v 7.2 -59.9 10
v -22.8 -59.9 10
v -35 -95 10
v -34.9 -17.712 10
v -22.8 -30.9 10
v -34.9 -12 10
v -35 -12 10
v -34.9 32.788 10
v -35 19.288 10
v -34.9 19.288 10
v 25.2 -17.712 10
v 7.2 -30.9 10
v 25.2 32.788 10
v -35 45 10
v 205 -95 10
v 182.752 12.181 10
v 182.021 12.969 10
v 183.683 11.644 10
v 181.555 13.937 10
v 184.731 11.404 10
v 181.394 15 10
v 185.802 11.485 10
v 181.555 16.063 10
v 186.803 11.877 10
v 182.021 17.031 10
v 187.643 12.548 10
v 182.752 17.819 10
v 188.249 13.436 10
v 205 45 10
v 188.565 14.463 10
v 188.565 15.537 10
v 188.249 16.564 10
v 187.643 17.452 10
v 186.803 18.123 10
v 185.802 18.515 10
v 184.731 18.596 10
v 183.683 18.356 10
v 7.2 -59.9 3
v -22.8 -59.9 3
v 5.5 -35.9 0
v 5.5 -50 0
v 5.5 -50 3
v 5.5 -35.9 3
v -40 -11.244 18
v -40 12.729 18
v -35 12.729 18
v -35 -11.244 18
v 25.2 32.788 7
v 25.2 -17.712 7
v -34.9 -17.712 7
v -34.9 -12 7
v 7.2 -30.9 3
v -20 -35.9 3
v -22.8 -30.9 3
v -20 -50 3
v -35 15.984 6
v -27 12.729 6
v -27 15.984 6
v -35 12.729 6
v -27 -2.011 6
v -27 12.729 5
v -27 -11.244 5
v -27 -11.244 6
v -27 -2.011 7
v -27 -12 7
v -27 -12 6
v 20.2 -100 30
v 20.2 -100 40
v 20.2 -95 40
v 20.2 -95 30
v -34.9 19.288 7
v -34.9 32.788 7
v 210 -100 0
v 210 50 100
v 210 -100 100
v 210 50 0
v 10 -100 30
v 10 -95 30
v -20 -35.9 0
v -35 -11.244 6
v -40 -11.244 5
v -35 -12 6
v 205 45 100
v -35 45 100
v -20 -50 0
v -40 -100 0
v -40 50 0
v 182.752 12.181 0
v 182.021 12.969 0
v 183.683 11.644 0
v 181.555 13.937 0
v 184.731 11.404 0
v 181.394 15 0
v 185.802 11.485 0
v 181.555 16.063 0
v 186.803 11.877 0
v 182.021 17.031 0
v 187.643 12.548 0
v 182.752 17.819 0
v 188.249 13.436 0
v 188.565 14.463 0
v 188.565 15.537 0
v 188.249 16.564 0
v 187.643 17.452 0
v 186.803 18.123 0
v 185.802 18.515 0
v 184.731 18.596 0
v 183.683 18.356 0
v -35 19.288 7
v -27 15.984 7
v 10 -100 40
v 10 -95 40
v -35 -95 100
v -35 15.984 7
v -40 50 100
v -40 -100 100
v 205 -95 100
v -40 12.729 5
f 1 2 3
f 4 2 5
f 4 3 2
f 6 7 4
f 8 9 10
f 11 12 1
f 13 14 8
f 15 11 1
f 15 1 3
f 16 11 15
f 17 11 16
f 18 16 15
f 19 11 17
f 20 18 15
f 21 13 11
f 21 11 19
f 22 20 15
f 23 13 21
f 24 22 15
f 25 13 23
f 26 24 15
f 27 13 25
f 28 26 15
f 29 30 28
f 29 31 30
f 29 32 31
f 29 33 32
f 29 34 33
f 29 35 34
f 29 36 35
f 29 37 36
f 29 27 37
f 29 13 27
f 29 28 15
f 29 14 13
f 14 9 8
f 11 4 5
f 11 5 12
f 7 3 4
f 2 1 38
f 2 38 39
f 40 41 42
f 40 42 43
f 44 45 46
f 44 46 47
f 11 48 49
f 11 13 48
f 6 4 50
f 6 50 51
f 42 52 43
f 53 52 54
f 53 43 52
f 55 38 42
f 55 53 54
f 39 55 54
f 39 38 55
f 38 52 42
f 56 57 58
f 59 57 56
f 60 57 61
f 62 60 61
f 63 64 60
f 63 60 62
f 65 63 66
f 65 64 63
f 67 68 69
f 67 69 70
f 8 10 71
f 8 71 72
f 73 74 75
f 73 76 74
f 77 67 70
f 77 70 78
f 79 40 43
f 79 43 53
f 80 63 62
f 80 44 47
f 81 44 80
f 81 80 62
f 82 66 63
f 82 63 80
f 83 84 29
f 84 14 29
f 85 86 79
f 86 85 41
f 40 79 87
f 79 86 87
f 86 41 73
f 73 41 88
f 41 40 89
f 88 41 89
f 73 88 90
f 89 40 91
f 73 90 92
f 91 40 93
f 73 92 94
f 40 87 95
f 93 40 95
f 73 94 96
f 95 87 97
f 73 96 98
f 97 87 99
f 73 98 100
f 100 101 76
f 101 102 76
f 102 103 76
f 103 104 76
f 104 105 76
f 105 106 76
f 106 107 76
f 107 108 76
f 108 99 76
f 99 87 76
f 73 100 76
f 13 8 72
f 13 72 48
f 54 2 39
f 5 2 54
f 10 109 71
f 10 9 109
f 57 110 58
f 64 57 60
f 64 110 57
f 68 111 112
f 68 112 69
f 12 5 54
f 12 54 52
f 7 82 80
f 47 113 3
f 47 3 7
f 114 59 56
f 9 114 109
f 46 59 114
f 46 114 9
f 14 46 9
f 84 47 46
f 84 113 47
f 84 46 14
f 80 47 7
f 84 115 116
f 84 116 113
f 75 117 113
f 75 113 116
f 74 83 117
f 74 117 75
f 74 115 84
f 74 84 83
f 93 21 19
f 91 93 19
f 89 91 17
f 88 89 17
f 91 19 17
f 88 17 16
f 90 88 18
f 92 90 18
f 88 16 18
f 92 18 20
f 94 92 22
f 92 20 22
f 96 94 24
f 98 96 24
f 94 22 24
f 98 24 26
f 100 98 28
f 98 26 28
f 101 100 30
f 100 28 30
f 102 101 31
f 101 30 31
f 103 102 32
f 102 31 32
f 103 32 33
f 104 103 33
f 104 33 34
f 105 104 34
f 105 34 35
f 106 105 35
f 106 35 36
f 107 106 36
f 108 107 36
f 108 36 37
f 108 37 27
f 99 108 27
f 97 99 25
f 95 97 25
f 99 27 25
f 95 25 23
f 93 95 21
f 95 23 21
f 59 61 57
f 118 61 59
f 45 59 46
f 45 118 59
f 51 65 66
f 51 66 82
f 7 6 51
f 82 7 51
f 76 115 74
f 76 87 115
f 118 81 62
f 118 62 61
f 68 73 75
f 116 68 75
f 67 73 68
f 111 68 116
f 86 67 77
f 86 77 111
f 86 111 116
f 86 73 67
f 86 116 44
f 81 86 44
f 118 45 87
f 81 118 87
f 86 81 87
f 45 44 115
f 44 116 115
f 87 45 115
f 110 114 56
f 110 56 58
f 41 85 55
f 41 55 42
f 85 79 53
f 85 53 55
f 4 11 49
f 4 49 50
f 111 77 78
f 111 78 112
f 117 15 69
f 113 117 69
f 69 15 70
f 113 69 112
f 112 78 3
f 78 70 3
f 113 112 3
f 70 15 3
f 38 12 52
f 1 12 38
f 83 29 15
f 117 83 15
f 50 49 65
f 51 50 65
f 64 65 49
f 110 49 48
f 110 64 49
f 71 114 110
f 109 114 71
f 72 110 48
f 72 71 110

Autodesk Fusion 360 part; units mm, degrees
sketch "Sketch1" plane through (0, 0, 0) normal (0, 0, 1) x (1, 0, 0)
  line L0 (-40, 50) -> (210, 50)
  line L1 (210, 50) -> (210, -100)
  line L2 (210, -100) -> (-40, -100)
  line L3 (-40, -100) -> (-40, 50)
  line L4 (-35, 45) -> (205, 45)
  line L5 (205, 45) -> (205, -95)
  line L6 (205, -95) -> (-35, -95)
  line L7 (-35, -95) -> (-35, 45)
  dimension "d1" = 250
  dimension "d2" = 150
  dimension "d3" = 5
  dimension "d4" = 5
  dimension "d5" = 5
  dimension "d6" = 5
sketch "Sketch2" plane through (0, 0, 0) normal (0, 0, 1) x (1, 0, 0)
  circle A0 centre (185, 15) radius 3.5
  line L0 (205, 45) -> (205, -95)
  line L1 (-35, 45) -> (205, 45)
  dimension "d7" = 7
  dimension "d8" = 20
  dimension "d9" = 30
  dimension "d12" = 20
sketch "Sketch3" plane through (0, 0, 0) normal (0, 0, 1) x (1, 0, 0)
extrude "Extrude1" add sketch "Sketch1" along normal blind 100
sketch "Sketch4" plane through (0, 0, 0) normal (0, 1, 0) x (1, 0, 0)
sketch "Sketch5" plane through (0, 0, 0) normal (0, 0, 1) x (1, 0, 0)
  line L0 (-35, 45) -> (205, 45)
  line L1 (205, 45) -> (205, -95)
  line L2 (205, -95) -> (-35, -95)
  line L3 (-35, -95) -> (-35, 45)
extrude "Extrude2" add sketch "Sketch5" along normal blind 10
sketch "Sketch6" plane through (0, 0, 10) normal (0, 0, 1) x (-1, 0, 0)
  line L0 (35, 95) -> (-205, 95)
  line L1 (-205, 95) -> (-205, -45)
  line L2 (-205, -45) -> (35, -45)
  line L3 (35, -45) -> (35, 95)
  circle A0 centre (-185, -15) radius 3.6056
extrude "Extrude3" cut sketch "Sketch6" against normal blind 10 contours A0
sketch "Sketch7" plane through (0, 0, 0) normal (0, 0, 1) x (1, 0, 0)
  line L0 (-20, -50) -> (5.5, -50)
  line L1 (5.5, -50) -> (5.5, -35.9)
  line L2 (5.5, -35.9) -> (-20, -35.9)
  line L3 (-20, -35.9) -> (-20, -50)
  line L4 (210, -100) -> (-40, -100)
  dimension "d20" = 25.5
  dimension "d21" = 14.1
  dimension "d22" = 50
extrude "Extrude4" cut sketch "Sketch7" along normal blind 10
sketch "Sketch8" plane through (0, 0, 10) normal (0, 0, 1) x (-1, 0, 0)
  line L0 (20, 35.9) -> (-5.5, 35.9)
  line L1 (-5.5, 35.9) -> (-5.5, 50)
  line L2 (-5.5, 50) -> (20, 50)
  line L3 (20, 50) -> (20, 35.9)
  circle A0 centre (-185, -15) radius 3.6056
  line L4 (35, 95) -> (-205, 95)
  line L5 (-205, 95) -> (-205, -45)
  line L6 (-205, -45) -> (35, -45)
  line L7 (35, -45) -> (35, 95)
  line L8 (22.8, 30.9) -> (-7.2, 30.9)
  line L9 (-7.2, 30.9) -> (-7.2, 59.9)
  line L10 (-7.2, 59.9) -> (22.8, 59.9)
  line L11 (22.8, 59.9) -> (22.8, 30.9)
  dimension "d25" = 30
  dimension "d26" = 29
  dimension "d27" = 5
  dimension "d28" = 1.7
  dimension "d29" = 29
extrude "Extrude5" cut sketch "Sketch8" against normal blind 7 contours L8 L9 L10 L11
sketch "Sketch9" plane through (0, 0, 10) normal (0, 0, 1) x (-1, 0, 0)
  line L0 (-7.2, 30.9) -> (-7.2, 59.9)
  line L1 (-7.2, 59.9) -> (22.8, 59.9)
  line L2 (22.8, 59.9) -> (22.8, 30.9)
  line L3 (22.8, 30.9) -> (-7.2, 30.9)
  circle A0 centre (-185, -15) radius 3.6056
  line L4 (35, 95) -> (-205, 95)
  line L5 (-205, 95) -> (-205, -45)
  line L6 (-205, -45) -> (35, -45)
  line L7 (35, -45) -> (35, 95)
sketch "Sketch10" plane through (0, 0, 10) normal (0, 0, 1) x (-1, 0, 0)
sketch "Sketch11" plane through (0, 0, 10) normal (0, 0, 1) x (-1, 0, 0)
  line L0 (34.9, -32.7882) -> (-25.2, -32.7882)
  line L1 (-25.2, -32.7882) -> (-25.2, 17.7118)
  line L2 (-25.2, 17.7118) -> (34.9, 17.7118)
  line L3 (34.9, 17.7118) -> (34.9, -32.7882)
  line L4 (35.6, -7.5382) -> (29.9, -7.5382)
  line L5 (29.9, -7.5382) -> (29.9, -15.5382)
  line L6 (29.9, -15.5382) -> (35.6, -15.5382)
  line L7 (35.6, -15.5382) -> (35.6, -7.5382)
  line L8 (35, 95) -> (35, -45)
  dimension "d38" = 60.1
  dimension "d39" = 50.5
  dimension "d40" = 5.7
  dimension "d41" = 8
  dimension "d42" = 55.1
  dimension "d43" = 0.1
sketch "Sketch12" plane through (0, 0, 0) normal (1, 0, 0) x (0, 1, 0)
sketch "Sketch13" plane through (-40, 0, 0) normal (-1, 0, 0) x (0, -1, 0)
  line L0 (-50, 0) -> (100, 0)
  line L1 (100, 0) -> (100, 100)
  line L2 (100, 100) -> (-50, 100)
  line L3 (-50, 100) -> (-50, 0)
  line L4 (-19.2882, 18) -> (-4.2882, 18)
  line L5 (-4.2882, 18) -> (-4.2882, 3)
  line L6 (-4.2882, 3) -> (-19.2882, 3)
  line L7 (-19.2882, 3) -> (-19.2882, 18)
  line L8 (-15.5382, 10) -> (-7.5382, 10)
  dimension "d44" = 15
  dimension "d45" = 15
  dimension "d46" = 8
  dimension "d47" = 3.75
extrude "Extrude6" cut sketch "Sketch13" against normal blind 13 contours L4 L5 L6 L7
extrude "Extrude7" cut sketch "Sketch11" against normal blind 3 contours L0 L1 L2 L3 L4 L5 L6
sketch "Sketch14" plane through (0, 0, 0) normal (0, 0, 1) x (1, 0, 0)
sketch "Sketch15" plane through (0, 0, 0) normal (0, 0, 1) x (1, 0, 0)
sketch "Sketch16" plane through (0, -100, 0) normal (0, -1, 0) x (1, 0, 0)
  line L0 (-40, 0) -> (210, 0)
  line L1 (210, 0) -> (210, 100)
  line L2 (210, 100) -> (-40, 100)
  line L3 (-40, 100) -> (-40, 0)
  line L4 (10, 40) -> (20.2, 40)
  line L5 (20.2, 40) -> (20.2, 30)
  line L6 (20.2, 30) -> (10, 30)
  line L7 (10, 30) -> (10, 40)
  line L8 (205, 0) -> (-35, 0)
  dimension "d52" = 10.2
  dimension "d53" = 10
  dimension "d54" = 30
  dimension "d55" = 50
extrude "Extrude8" cut sketch "Sketch16" against normal blind 10 contours L4 L5 L6 L7
sketch "Sketch17" plane through (-40, 0, 0) normal (-1, 0, 0) x (0, -1, 0)
  line L0 (-4.2882, 18) -> (-4.2882, 3)
  line L1 (-4.2882, 3) -> (-19.2882, 3)
  line L2 (-19.2882, 3) -> (-19.2882, 18)
  line L3 (-19.2882, 18) -> (-4.2882, 18)
  line L4 (-50, 0) -> (100, 0)
  line L5 (100, 0) -> (100, 100)
  line L6 (100, 100) -> (-50, 100)
  line L7 (-50, 100) -> (-50, 0)
  line L8 (-19.2882, 18) -> (-4.2882, 18)
  line L9 (-4.2882, 18) -> (-4.2882, 3)
  line L10 (-4.2882, 3) -> (-19.2882, 3)
  line L11 (-19.2882, 3) -> (-19.2882, 18)
extrude "Extrude9" add sketch "Sketch17" against normal blind 13 contours L0 L1 L2 L3 L8 L9 L10 L11
sketch "Sketch18" plane through (0, 0, 10) normal (0, 0, 1) x (-1, 0, 0)
  line L0 (26.9999, 2.0114) -> (35, 2.0114)
  line L1 (35, 2.0114) -> (35, -15.984)
  line L2 (35, -15.984) -> (26.9999, -15.984)
  line L3 (26.9999, -15.984) -> (26.9999, 2.0114)
extrude "Extrude10" cut 1 faces at (-32.3333, 14.2882, 18) along direction (0, 0, -1) blind 11
extrude "Extrude11" cut sketch "Sketch18" against normal blind 4
sketch "Sketch19" plane through (-35, 0, 0) normal (1, 0, 0) x (0, 1, 0)
  line L0 (15.984, 7) -> (19.2882, 7)
  line L1 (19.2882, 7) -> (19.2882, 10)
  line L2 (19.2882, 10) -> (45, 10)
  line L3 (45, 10) -> (45, 100)
  line L4 (45, 100) -> (-95, 100)
  line L5 (-95, 100) -> (-95, 10)
  line L6 (-95, 10) -> (-2.0114, 10)
  line L7 (-2.0114, 10) -> (-2.0114, 6)
  line L8 (-2.0114, 6) -> (15.984, 6)
  line L9 (15.984, 6) -> (15.984, 7)
  line L10 (-2.0114, 10) -> (15.984, 10)
  line L11 (-2.0114, 7) -> (-2.0114, 10)
sketch "Sketch20" plane through (-35, 0, 0) normal (1, 0, 0) x (0, 1, 0)
sketch "Sketch21" plane through (-35, 0, 0) normal (1, 0, 0) x (0, 1, 0)
  line L0 (-2, 10) -> (16, 10)
  line L1 (16, 10) -> (16, 7)
  line L2 (16, 7) -> (-2, 7)
  line L3 (-2, 7) -> (-2, 10)
sketch "Sketch22" plane through (-40, 0, 0) normal (-1, 0, 0) x (0, -1, 0)
  line L0 (-50, 0) -> (100, 0)
  line L1 (100, 0) -> (100, 100)
  line L2 (100, 100) -> (-50, 100)
  line L3 (-50, 100) -> (-50, 0)
  line L4 (-16, 10) -> (2, 10)
  line L5 (2, 10) -> (2, 7)
  line L6 (2, 7) -> (-16, 7)
  line L7 (-16, 7) -> (-16, 10)
extrude "Extrude12" cut sketch "Sketch22" against normal blind 6 contours L4 L5 L6 L7
sketch "Sketch23" plane through (-35, 0, 0) normal (1, 0, 0) x (0, 1, 0)
sketch "Sketch24" plane through (-40, 0, 0) normal (-1, 0, 0) x (0, -1, 0)
  line L0 (2, 10) -> (2, 7)
  line L1 (2, 7) -> (-16, 7)
  line L2 (-16, 7) -> (-16, 10)
  line L3 (-16, 10) -> (2, 10)
  line L4 (-50, 0) -> (100, 0)
  line L5 (100, 0) -> (100, 100)
  line L6 (100, 100) -> (-50, 100)
  line L7 (-50, 100) -> (-50, 0)
  line L8 (-16, 14) -> (2, 14)
  line L9 (2, 14) -> (2, 6)
  line L10 (2, 6) -> (-16, 6)
  line L11 (-16, 6) -> (-16, 14)
extrude "Extrude13" cut sketch "Sketch24" against normal blind 58 contours L3 L8 L9 L11
sketch "Sketch25" plane through (-35, 0, 0) normal (1, 0, 0) x (0, 1, 0)
extrude "Extrude14" add sketch "Sketch21" against normal blind 5
sketch "Sketch26" plane through (-35, 0, 0) normal (1, 0, 0) x (0, 1, 0)
  line L0 (16, 14) -> (-2, 14)
  line L1 (-2, 14) -> (-2, 10)
  line L2 (-2, 10) -> (16, 10)
  line L3 (16, 10) -> (16, 14)
extrude "Extrude15" add sketch "Sketch26" against normal blind 5
sketch "Sketch27" plane through (0, 0, 10) normal (0, 0, 1) x (-1, 0, 0)
  line L0 (27, 12) -> (35, 12)
  line L1 (35, 12) -> (35, 2)
  line L2 (35, 2) -> (27, 2)
  line L3 (27, 2) -> (27, 12)
extrude "Extrude16" cut sketch "Sketch27" against normal blind 4
sketch "Sketch28" plane through (0, 0, 10) normal (0, 0, 1) x (-1, 0, 0)
sketch "Sketch29" plane through (0, 0, 10) normal (0, 0, 1) x (-1, 0, 0)
sketch "Sketch30" plane through (0, 0, 0) normal (1, 0, 0) x (0, 1, 0)
sketch "Sketch31" plane through (-40, 0, 0) normal (-1, 0, 0) x (0, -1, 0)
  line L0 (-50, 0) -> (100, 0)
  line L1 (100, 0) -> (100, 100)
  line L2 (100, 100) -> (-50, 100)
  line L3 (-50, 100) -> (-50, 0)
  line L4 (-12.7294, 18) -> (11.2444, 18)
  line L5 (11.2444, 18) -> (11.2444, 5)
  line L6 (11.2444, 5) -> (-12.7294, 5)
  line L7 (-12.7294, 5) -> (-12.7294, 18)
extrude "Extrude17" cut sketch "Sketch31" against normal blind 13 contours L4 L5 L6 L7
